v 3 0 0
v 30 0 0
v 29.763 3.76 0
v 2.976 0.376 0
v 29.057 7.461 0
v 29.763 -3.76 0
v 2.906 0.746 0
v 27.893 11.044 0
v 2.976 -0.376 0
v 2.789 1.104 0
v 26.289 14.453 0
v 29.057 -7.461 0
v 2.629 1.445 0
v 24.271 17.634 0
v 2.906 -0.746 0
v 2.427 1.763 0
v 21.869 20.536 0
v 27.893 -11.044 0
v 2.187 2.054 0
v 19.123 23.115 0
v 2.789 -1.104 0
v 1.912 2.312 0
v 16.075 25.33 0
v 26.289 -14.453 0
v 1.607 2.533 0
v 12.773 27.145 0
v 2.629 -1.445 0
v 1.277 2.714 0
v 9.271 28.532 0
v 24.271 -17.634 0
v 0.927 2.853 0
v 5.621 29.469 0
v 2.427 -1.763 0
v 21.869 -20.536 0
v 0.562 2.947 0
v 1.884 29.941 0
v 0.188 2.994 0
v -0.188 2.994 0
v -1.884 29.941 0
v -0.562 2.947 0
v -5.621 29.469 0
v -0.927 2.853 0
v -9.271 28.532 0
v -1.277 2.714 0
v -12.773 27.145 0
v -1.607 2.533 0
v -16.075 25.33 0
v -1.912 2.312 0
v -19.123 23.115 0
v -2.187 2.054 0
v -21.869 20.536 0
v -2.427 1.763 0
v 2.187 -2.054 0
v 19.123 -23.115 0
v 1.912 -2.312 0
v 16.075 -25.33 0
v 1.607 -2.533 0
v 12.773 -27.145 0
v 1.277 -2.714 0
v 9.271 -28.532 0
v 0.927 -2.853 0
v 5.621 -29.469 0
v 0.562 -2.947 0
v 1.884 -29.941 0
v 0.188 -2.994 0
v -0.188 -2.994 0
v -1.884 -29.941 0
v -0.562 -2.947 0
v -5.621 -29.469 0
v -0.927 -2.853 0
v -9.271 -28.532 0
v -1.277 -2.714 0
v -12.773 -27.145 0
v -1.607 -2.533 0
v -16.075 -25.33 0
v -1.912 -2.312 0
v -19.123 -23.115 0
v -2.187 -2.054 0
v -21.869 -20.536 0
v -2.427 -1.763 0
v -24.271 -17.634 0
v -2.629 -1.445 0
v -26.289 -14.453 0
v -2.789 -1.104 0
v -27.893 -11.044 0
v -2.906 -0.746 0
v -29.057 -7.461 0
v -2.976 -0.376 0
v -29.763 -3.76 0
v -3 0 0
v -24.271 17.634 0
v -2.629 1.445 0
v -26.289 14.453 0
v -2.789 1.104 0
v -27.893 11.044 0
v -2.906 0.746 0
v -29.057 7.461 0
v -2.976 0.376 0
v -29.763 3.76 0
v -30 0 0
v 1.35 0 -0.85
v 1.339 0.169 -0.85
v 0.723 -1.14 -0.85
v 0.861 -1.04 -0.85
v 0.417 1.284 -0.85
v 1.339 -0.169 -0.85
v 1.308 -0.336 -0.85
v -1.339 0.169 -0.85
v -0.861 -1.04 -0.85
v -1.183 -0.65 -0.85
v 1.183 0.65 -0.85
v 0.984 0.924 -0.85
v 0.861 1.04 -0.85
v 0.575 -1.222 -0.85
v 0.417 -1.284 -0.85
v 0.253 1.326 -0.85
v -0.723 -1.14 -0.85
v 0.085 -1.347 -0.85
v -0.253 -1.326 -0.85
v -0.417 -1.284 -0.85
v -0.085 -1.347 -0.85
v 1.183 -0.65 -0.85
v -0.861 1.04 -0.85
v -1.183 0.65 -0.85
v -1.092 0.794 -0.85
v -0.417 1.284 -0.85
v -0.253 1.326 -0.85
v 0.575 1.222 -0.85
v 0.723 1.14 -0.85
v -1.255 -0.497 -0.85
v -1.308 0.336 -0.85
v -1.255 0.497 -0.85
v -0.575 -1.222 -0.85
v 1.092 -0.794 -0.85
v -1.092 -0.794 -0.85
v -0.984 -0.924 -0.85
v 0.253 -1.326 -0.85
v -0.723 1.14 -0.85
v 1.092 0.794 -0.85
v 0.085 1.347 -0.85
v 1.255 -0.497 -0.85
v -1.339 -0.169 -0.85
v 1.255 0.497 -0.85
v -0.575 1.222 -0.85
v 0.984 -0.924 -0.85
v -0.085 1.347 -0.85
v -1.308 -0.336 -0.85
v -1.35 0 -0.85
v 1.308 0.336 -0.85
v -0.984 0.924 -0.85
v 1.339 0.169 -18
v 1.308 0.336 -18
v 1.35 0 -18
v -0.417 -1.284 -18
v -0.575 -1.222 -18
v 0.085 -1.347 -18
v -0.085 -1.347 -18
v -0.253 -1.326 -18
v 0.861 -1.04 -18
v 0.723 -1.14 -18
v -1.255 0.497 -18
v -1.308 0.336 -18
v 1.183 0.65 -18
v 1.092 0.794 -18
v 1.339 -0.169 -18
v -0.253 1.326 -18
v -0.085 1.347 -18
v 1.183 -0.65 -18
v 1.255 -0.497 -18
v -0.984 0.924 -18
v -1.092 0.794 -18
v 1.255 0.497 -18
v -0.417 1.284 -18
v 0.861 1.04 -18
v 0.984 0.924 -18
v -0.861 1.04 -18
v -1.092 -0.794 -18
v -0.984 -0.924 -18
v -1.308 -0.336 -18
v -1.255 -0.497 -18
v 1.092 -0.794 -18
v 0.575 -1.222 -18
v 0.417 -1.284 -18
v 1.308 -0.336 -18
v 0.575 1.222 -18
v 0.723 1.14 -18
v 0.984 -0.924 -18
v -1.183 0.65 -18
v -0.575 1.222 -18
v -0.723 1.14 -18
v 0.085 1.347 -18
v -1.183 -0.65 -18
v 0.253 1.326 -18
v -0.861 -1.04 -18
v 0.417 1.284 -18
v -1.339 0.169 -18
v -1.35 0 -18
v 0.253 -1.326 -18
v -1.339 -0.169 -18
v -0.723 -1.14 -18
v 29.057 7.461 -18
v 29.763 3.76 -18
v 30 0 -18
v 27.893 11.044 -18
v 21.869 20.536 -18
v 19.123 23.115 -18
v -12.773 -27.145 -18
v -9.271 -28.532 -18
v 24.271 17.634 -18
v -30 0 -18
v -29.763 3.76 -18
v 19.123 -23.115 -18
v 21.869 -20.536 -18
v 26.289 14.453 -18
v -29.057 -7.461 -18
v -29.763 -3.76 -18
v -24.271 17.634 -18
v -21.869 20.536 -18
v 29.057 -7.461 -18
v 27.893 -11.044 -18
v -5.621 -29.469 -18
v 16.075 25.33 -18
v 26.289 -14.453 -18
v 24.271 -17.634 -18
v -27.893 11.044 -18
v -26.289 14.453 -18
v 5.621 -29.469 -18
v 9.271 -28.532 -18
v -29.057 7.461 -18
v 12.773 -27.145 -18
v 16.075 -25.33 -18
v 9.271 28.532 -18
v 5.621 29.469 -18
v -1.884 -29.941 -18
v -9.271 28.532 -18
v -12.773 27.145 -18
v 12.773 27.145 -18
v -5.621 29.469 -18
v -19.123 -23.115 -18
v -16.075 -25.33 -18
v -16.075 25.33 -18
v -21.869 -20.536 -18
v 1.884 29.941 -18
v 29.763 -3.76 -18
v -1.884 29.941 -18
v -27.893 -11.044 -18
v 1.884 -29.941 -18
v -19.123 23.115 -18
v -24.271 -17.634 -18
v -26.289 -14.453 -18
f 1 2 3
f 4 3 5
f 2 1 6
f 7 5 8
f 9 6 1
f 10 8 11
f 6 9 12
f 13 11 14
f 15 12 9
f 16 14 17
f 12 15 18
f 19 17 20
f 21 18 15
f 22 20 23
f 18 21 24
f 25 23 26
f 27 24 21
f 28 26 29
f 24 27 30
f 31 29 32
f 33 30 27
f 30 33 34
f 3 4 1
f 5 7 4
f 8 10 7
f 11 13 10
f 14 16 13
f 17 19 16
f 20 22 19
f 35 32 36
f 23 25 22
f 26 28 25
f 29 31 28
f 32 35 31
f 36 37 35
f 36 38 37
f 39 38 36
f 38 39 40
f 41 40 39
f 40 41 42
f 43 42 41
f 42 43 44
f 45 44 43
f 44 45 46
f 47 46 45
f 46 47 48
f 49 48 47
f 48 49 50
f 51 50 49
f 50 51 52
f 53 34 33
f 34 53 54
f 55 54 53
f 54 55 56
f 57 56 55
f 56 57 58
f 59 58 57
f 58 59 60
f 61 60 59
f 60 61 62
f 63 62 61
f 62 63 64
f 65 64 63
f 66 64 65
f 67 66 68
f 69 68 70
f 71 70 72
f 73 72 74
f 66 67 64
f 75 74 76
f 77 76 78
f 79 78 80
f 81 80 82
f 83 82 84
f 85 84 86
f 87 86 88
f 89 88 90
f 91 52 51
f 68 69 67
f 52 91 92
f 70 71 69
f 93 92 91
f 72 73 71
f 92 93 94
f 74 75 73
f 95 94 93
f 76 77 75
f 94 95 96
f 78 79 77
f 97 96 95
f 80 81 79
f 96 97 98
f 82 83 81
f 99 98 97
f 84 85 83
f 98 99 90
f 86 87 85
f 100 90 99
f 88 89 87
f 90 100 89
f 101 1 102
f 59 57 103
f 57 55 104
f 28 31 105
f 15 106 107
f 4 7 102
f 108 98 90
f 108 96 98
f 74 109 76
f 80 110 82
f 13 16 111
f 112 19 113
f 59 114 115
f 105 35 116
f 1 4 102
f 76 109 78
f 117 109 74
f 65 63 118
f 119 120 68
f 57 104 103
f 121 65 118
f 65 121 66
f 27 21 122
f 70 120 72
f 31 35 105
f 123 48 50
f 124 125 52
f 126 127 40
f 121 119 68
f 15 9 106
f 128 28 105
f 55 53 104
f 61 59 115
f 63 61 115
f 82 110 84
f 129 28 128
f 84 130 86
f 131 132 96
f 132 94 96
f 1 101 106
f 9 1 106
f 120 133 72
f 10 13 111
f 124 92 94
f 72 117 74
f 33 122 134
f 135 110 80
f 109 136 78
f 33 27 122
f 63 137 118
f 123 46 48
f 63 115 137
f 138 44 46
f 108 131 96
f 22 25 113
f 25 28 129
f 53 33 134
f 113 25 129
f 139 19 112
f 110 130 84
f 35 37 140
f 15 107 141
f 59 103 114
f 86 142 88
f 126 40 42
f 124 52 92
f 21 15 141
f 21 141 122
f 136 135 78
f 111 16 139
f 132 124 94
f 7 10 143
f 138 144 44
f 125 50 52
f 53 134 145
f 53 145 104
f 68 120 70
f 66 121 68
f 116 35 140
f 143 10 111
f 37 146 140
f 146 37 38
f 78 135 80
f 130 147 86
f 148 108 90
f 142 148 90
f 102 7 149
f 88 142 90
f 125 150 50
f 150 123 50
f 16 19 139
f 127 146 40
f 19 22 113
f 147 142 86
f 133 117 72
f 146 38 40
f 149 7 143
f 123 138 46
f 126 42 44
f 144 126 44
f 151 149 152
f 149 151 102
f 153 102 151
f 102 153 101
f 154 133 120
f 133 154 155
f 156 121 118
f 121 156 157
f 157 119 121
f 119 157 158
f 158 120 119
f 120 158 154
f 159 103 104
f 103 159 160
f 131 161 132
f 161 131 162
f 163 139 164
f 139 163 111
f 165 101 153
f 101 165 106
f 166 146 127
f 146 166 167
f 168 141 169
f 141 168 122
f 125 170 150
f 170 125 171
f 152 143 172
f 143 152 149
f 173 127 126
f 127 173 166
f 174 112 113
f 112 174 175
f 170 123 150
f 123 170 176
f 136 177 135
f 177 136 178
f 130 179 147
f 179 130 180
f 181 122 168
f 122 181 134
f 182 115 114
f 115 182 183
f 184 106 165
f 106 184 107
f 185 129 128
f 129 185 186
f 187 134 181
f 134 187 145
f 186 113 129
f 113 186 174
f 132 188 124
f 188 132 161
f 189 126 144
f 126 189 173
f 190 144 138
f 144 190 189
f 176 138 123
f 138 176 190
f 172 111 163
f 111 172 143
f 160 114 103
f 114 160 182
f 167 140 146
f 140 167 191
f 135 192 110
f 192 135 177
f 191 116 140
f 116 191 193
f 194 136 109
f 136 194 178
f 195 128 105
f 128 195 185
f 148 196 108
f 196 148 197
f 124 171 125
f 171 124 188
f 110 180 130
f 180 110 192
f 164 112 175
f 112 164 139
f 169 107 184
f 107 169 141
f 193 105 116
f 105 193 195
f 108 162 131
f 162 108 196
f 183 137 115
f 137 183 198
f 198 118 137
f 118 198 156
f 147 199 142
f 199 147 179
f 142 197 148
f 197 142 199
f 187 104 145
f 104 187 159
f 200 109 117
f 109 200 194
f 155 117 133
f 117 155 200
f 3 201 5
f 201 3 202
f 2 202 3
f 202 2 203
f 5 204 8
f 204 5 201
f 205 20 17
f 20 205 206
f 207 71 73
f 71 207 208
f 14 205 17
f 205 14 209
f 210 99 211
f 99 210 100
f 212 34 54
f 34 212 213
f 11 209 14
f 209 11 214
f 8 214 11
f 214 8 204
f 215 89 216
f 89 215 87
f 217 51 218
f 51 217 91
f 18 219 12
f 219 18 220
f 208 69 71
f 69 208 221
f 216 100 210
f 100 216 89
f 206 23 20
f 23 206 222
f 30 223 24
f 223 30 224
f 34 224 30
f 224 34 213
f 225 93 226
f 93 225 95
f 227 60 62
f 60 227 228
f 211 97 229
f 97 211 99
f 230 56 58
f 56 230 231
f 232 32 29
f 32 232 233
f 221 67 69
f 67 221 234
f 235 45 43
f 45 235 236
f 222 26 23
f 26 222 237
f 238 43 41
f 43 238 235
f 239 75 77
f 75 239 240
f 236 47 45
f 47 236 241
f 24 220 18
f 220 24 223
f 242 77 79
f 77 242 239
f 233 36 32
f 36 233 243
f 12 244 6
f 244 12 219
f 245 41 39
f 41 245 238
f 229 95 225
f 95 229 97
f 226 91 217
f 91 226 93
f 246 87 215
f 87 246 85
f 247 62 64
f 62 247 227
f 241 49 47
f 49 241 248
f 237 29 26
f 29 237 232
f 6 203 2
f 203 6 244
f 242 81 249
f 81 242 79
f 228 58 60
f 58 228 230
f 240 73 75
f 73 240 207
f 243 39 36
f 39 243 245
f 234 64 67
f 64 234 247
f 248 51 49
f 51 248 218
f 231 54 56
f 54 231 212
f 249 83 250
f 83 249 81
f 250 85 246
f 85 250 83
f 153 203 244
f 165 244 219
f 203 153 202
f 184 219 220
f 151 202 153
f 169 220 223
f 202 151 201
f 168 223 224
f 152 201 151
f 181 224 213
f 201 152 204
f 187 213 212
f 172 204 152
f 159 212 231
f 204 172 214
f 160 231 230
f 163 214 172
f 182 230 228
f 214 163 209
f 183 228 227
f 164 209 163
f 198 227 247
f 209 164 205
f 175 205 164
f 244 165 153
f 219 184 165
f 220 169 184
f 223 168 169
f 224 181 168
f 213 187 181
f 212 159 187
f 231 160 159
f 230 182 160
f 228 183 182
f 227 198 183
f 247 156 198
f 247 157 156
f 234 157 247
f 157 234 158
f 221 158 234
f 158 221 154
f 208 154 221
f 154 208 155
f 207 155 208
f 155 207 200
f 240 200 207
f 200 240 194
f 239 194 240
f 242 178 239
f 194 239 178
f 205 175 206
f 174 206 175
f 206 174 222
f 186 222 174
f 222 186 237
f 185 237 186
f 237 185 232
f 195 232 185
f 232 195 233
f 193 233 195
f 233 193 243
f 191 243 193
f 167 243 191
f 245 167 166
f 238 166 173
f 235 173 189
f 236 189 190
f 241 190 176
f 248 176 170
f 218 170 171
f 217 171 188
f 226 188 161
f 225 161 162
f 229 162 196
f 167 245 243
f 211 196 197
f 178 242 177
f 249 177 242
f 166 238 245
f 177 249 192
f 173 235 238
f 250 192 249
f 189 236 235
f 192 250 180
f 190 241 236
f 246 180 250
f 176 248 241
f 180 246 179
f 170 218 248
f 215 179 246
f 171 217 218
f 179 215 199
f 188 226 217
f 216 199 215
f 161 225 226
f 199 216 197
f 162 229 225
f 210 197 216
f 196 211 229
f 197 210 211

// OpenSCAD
$fn = 50;

difference() {
	union() {
		translate(v = [0, 0, -18.0]) {
			cylinder(h = 18, r = 30.0);
		}
	}
	union() {
		translate(v = [0, 0, 0]) {
			rotate(a = [0, 0, 0]) {
				difference() {
					union() {
						translate(v = [0, 0, -21.0]) {
							cylinder(h = 21, r = 1.0);
						}
						translate(v = [0, 0, -0.85]) {
							cylinder(h = 0.85, r1 = 1.35, r2 = 3.0);
						}
						translate(v = [0, 0, -21.0]) {
							cylinder(h = 21, r = 1.35);
						}
						translate(v = [0, 0, -21.0]) {
							cylinder(h = 21, r = 1.0);
						}
					}
					union();
				}
			}
		}
	}
}
